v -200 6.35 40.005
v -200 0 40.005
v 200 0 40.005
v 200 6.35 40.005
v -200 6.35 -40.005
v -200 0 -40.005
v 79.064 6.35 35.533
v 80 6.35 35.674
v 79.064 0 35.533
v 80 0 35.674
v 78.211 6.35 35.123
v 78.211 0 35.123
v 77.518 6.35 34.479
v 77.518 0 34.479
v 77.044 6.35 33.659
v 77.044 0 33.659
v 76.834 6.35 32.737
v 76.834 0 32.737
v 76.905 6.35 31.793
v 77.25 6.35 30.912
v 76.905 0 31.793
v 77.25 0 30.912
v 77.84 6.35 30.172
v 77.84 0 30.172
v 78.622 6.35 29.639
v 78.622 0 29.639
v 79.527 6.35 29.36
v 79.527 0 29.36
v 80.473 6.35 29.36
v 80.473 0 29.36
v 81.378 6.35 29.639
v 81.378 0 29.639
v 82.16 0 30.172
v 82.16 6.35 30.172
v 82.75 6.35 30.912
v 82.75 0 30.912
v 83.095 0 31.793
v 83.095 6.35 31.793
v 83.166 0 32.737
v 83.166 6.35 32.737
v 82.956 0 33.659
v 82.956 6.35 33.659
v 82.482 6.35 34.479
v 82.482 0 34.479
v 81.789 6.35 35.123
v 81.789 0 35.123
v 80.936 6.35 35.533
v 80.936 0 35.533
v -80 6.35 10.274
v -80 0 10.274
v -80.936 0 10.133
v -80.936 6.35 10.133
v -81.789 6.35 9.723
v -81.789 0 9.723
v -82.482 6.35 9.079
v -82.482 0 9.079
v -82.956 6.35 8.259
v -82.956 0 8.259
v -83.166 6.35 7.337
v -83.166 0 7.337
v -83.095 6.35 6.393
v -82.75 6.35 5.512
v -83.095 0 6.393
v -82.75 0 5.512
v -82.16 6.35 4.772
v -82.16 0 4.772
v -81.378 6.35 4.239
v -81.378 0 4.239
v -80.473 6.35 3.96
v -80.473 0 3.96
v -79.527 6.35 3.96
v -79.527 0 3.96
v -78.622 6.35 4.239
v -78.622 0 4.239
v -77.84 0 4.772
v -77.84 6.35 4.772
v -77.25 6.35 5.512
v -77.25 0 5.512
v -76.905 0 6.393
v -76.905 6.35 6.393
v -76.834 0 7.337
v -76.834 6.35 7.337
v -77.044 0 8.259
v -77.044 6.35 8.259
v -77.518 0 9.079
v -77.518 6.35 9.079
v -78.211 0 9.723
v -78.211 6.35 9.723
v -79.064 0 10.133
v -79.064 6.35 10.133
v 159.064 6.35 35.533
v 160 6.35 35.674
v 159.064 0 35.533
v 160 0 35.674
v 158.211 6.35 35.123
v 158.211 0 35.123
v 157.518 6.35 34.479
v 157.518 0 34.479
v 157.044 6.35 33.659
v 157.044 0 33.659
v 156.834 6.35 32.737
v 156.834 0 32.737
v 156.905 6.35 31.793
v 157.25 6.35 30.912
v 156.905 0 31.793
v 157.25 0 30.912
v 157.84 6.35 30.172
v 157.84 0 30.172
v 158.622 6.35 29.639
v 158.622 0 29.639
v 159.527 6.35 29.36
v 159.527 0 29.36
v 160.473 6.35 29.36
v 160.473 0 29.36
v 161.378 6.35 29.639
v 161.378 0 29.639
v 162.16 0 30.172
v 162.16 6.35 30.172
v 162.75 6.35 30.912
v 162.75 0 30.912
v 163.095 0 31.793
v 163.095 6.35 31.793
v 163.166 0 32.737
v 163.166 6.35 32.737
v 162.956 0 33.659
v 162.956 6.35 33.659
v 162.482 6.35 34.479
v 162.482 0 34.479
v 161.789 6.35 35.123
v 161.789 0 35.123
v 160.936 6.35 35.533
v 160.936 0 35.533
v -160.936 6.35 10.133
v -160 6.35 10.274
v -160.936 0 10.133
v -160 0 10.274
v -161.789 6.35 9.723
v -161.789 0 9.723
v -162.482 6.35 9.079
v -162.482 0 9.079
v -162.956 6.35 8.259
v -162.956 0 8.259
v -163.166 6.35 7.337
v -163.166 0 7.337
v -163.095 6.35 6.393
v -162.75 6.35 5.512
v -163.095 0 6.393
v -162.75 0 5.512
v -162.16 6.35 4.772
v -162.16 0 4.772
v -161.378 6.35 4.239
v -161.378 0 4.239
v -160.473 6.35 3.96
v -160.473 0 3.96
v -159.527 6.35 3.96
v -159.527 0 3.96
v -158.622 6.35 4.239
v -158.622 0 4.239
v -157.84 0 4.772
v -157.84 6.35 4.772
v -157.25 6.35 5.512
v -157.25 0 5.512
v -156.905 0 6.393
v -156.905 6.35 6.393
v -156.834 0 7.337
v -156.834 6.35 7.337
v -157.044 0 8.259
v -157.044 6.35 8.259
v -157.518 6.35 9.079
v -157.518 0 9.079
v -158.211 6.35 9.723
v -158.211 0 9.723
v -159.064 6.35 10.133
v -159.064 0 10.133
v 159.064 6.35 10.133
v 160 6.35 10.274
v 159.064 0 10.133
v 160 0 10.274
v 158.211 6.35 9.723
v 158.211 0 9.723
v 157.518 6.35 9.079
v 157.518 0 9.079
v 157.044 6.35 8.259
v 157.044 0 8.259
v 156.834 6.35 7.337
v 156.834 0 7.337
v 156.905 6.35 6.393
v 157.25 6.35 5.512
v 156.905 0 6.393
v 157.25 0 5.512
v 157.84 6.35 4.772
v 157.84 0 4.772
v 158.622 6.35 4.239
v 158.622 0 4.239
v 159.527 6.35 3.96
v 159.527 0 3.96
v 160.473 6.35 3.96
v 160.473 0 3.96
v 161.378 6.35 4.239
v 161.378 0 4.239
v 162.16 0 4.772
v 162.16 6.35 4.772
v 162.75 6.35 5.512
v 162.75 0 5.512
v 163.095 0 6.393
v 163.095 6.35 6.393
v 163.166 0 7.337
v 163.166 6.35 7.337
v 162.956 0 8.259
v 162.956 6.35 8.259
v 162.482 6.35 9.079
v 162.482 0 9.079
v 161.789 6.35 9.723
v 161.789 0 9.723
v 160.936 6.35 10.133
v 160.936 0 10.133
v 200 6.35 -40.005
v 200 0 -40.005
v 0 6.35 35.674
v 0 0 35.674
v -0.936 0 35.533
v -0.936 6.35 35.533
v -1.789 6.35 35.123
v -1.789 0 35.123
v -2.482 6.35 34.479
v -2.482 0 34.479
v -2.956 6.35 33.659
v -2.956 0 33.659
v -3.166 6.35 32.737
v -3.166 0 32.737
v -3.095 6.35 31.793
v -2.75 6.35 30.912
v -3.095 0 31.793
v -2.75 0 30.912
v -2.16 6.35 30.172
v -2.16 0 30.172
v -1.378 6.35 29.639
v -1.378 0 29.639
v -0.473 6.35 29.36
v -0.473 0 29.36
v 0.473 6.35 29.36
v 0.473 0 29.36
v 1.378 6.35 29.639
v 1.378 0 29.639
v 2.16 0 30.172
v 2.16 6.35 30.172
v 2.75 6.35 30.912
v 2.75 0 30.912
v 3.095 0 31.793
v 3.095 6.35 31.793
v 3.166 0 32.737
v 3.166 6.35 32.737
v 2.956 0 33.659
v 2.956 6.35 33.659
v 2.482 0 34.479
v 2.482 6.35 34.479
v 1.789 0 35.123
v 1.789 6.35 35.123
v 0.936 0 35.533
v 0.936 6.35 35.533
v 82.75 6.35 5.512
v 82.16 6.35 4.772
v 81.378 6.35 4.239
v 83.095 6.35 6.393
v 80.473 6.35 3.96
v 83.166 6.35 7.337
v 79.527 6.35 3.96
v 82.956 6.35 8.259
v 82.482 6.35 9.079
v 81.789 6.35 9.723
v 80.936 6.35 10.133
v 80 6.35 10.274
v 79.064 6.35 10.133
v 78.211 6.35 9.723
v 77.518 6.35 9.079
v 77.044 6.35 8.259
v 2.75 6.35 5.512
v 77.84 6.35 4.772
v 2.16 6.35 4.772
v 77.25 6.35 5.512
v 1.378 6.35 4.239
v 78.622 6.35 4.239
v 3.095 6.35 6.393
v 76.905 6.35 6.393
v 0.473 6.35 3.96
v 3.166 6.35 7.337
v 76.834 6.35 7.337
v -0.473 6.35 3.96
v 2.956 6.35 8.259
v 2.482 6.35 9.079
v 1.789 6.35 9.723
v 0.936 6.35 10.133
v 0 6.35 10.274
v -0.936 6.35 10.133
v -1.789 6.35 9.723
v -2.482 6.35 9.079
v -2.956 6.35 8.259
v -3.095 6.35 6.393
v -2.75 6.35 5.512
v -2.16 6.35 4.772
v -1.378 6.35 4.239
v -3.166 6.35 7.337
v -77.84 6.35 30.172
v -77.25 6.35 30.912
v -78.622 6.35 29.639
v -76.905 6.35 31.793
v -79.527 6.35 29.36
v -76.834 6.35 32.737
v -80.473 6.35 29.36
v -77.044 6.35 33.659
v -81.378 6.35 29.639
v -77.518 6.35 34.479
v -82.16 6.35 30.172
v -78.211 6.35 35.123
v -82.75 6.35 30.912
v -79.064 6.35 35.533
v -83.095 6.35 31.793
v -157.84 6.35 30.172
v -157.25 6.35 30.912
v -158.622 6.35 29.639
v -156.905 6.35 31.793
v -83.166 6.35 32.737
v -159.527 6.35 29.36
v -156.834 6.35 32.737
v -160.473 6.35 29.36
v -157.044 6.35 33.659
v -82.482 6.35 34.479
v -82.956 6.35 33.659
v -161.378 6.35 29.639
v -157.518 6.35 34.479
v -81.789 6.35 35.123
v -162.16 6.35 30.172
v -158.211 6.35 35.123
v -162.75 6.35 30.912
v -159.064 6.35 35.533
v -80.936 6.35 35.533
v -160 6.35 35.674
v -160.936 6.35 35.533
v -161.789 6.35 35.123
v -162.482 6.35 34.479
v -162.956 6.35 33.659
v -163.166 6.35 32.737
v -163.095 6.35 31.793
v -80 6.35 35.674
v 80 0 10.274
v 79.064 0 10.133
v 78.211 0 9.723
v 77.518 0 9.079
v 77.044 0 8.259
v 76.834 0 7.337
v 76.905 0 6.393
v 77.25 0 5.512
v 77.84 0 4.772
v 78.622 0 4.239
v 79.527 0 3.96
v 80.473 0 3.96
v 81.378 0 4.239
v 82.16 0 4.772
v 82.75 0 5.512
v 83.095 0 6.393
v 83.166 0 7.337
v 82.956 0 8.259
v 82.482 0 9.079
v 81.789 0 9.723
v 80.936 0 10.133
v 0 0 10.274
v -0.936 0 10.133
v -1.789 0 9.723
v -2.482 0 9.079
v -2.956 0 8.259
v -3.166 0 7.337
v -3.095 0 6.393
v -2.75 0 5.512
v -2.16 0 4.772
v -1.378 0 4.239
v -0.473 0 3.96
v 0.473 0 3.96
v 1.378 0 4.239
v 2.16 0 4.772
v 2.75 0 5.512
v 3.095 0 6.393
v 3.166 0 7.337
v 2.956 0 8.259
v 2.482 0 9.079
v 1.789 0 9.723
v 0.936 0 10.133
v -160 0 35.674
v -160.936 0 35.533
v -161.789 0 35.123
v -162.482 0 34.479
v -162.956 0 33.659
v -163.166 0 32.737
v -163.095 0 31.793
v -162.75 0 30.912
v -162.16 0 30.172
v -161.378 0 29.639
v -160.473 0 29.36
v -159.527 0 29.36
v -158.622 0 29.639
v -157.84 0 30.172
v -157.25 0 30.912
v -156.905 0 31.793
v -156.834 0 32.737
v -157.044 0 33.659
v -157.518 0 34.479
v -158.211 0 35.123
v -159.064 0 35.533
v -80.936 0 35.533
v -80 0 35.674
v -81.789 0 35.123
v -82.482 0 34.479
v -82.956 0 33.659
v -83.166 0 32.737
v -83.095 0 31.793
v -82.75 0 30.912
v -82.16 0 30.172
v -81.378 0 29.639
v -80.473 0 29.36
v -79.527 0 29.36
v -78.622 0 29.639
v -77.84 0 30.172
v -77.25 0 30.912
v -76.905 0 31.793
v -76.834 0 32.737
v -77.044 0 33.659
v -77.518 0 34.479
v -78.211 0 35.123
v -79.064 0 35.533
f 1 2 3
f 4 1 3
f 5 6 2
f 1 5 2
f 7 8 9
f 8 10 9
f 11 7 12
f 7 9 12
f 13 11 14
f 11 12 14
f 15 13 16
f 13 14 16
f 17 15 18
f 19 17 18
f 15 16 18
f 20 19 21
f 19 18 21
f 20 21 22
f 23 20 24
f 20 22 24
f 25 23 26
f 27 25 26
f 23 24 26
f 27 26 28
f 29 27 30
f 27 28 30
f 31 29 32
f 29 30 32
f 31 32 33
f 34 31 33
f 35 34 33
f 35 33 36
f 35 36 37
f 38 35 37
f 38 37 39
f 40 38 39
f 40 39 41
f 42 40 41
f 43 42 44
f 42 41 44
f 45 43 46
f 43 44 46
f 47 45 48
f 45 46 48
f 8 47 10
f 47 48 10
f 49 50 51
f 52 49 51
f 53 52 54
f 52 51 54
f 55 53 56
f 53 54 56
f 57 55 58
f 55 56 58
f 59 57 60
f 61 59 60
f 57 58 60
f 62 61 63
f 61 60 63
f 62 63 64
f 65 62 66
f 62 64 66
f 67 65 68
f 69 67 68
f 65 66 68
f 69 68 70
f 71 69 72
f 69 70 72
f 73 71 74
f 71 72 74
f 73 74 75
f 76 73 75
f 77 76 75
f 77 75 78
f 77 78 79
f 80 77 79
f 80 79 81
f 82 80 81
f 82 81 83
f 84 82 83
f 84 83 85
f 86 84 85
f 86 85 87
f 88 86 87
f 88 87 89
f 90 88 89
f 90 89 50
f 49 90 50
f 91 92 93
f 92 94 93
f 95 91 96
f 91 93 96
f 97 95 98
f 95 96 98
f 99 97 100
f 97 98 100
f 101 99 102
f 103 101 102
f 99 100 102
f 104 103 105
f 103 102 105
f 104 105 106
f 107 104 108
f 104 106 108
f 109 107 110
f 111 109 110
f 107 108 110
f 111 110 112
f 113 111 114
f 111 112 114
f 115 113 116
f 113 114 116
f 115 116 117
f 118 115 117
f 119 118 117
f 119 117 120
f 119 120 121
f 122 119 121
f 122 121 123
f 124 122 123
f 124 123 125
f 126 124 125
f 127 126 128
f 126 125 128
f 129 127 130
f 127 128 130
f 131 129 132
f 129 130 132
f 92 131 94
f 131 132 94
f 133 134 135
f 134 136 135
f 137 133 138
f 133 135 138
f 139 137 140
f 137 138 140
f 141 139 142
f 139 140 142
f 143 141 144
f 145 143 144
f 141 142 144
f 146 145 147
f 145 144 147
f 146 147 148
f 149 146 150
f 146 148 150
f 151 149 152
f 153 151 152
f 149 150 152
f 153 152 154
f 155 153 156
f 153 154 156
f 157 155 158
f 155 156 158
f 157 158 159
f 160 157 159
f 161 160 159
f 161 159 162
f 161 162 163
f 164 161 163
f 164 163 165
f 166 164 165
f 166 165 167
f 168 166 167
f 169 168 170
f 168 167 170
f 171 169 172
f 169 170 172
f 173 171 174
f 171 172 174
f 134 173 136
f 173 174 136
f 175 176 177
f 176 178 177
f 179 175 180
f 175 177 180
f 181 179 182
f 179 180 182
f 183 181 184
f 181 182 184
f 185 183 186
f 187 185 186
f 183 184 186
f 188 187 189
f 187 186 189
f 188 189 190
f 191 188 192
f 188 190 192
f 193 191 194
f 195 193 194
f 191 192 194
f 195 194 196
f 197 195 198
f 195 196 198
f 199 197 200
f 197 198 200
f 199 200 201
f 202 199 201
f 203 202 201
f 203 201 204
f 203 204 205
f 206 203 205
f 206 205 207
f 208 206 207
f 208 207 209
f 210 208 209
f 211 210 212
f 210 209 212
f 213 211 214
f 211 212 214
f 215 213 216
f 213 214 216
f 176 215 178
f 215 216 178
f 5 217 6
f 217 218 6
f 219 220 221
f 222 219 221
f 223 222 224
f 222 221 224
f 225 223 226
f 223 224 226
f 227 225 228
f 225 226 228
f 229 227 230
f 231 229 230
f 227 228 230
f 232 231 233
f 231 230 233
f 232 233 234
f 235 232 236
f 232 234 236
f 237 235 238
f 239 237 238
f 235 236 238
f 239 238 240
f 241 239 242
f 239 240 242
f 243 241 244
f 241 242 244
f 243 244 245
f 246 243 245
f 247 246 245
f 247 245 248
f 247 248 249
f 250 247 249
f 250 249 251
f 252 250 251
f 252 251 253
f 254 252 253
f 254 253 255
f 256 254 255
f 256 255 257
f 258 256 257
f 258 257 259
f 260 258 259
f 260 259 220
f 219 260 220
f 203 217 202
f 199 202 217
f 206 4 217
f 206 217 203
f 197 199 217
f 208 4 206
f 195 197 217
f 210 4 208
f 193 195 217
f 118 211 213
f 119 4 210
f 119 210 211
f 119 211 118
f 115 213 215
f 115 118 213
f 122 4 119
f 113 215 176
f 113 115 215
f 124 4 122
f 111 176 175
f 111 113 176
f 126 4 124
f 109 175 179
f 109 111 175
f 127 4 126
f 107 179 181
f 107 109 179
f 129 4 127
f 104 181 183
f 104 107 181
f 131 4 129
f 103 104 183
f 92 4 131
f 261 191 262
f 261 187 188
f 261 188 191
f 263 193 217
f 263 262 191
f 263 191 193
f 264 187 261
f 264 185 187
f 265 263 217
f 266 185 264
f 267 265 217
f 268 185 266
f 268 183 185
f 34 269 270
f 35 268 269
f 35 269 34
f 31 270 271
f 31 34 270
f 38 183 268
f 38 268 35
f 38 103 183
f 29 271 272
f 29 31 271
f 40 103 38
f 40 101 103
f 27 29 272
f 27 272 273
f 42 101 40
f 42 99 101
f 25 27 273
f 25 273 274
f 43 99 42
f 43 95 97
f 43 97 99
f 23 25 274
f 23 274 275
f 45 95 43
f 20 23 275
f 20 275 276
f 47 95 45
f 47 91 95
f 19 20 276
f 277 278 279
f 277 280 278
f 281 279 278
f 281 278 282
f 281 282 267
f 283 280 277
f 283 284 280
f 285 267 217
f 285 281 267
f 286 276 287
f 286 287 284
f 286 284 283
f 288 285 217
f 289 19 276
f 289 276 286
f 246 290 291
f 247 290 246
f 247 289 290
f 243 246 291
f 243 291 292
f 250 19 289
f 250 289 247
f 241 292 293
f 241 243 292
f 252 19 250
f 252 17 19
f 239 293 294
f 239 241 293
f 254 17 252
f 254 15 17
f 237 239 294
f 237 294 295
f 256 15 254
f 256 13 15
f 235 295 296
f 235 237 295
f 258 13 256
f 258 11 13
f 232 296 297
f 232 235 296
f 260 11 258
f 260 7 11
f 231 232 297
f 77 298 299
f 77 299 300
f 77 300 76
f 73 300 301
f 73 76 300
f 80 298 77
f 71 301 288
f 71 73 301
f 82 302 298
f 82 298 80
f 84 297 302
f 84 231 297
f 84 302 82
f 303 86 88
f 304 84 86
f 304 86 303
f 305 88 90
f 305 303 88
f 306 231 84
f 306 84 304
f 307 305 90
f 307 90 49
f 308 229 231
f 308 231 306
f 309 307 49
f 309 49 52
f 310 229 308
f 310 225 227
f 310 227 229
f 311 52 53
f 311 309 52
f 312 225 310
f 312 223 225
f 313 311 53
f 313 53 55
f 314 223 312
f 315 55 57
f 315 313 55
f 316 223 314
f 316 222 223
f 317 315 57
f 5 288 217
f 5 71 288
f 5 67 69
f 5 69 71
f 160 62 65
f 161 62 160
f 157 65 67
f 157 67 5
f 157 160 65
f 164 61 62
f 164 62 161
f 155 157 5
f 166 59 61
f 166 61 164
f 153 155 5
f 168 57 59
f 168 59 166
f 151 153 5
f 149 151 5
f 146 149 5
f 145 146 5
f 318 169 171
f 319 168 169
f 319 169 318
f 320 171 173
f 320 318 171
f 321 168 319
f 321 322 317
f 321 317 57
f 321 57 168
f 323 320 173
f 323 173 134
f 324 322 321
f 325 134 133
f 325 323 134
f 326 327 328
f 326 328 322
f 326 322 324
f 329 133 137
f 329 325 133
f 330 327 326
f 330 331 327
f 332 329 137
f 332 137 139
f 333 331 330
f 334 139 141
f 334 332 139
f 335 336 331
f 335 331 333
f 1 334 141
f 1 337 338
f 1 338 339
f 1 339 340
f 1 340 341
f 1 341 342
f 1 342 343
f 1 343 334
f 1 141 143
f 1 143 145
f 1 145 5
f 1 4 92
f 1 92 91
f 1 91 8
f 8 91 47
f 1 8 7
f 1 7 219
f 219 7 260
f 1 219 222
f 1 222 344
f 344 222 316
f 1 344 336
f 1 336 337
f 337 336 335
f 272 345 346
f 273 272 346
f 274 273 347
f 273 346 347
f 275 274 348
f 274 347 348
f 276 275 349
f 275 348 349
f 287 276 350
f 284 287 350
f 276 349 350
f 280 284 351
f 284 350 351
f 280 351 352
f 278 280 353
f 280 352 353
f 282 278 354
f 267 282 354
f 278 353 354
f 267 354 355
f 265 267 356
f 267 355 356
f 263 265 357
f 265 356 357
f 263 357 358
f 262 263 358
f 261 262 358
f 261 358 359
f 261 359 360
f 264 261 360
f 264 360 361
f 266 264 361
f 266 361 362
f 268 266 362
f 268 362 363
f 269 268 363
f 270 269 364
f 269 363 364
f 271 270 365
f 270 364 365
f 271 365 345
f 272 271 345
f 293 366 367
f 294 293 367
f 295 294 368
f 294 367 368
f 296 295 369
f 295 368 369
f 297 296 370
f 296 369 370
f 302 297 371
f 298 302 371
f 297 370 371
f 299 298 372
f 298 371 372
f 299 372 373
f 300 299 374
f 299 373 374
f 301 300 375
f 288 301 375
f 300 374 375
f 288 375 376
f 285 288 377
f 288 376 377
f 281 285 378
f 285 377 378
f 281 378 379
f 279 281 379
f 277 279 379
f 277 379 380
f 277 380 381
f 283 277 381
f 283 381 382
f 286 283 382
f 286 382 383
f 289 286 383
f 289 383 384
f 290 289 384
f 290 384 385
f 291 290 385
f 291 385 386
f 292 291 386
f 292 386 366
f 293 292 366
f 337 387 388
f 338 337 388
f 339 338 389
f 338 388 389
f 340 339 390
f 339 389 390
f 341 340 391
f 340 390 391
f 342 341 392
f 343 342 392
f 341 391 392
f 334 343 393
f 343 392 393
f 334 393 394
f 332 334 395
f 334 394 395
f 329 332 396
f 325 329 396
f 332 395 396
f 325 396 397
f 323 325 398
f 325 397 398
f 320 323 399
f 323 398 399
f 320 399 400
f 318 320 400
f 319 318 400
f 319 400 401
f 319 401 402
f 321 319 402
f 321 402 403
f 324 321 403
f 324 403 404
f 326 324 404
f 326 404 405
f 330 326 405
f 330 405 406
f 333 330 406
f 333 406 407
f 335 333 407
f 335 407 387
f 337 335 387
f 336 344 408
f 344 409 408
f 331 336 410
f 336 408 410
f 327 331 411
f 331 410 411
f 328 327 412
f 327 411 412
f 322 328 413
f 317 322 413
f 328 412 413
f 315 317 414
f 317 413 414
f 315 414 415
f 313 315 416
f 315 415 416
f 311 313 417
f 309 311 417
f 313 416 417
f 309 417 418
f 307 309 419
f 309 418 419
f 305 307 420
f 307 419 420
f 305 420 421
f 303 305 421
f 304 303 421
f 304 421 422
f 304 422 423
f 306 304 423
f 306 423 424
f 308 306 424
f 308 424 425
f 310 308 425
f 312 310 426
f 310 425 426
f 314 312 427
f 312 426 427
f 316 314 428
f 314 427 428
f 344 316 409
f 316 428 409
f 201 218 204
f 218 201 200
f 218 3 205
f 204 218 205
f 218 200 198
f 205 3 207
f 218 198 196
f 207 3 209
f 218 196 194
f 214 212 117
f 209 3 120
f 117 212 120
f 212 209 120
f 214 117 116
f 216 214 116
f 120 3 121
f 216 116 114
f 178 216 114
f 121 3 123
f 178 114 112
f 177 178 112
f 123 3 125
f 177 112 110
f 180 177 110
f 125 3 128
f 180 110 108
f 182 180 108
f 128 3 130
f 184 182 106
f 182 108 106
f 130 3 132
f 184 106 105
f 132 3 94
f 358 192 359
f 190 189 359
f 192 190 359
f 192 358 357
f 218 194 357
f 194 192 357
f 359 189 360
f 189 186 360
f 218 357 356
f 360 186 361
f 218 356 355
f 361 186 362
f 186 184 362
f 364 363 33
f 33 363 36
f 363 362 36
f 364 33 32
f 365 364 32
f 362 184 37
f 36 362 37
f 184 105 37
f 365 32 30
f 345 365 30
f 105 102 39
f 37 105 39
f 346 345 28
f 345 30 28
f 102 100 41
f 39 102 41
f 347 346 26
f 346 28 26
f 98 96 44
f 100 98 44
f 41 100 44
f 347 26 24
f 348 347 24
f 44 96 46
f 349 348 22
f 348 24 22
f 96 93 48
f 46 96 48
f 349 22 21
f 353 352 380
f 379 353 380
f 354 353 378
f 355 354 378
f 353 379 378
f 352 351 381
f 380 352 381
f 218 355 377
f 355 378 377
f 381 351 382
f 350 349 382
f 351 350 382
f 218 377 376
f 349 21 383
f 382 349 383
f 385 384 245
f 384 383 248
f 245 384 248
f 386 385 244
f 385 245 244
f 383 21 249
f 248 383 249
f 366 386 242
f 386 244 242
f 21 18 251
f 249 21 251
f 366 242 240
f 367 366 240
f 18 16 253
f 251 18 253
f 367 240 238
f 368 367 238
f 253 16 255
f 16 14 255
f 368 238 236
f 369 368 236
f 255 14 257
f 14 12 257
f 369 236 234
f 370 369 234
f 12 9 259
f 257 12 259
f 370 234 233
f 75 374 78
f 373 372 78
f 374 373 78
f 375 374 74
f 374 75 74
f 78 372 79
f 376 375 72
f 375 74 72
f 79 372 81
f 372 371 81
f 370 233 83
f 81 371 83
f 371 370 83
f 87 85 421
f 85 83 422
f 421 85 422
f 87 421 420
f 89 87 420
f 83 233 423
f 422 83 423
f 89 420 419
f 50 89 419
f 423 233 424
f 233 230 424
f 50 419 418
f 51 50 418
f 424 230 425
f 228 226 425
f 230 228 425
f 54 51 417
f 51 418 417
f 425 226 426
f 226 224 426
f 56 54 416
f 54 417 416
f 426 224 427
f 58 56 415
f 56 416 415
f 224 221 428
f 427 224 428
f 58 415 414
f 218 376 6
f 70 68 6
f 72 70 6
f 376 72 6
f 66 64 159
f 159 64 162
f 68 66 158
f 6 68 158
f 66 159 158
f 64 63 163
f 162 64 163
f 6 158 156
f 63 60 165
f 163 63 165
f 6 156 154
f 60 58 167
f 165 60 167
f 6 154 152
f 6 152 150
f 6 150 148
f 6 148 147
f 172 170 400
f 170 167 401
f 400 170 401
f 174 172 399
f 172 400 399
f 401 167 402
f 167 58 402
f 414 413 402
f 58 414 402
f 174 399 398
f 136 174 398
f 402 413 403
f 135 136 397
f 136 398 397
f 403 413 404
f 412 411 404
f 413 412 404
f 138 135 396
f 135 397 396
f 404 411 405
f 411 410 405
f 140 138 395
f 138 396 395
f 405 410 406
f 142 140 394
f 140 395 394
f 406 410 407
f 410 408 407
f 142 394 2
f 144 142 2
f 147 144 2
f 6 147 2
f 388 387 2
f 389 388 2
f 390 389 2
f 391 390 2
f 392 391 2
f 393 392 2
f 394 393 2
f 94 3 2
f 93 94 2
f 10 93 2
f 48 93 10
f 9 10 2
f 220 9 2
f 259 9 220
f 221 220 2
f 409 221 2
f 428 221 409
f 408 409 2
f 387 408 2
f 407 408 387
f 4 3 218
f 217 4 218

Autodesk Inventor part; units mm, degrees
ref_plane "YZ Plane" through (0, 0, 0) normal (1, 0, 0) x (0, 1, 0)
ref_plane "XZ Plane" through (0, 0, 0) normal (0, 1, 0) x (-1, 0, 0)
ref_plane "XY Plane" through (0, 0, 0) normal (0, 0, 1) x (1, 0, 0)
sketch "Sketch1" plane through (0, 0, 0) normal (0, 1, 0) x (-1, 0, 0)
  line L0 (200, 40.005) -> (-200, 40.005)
  line L1 (-200, 40.005) -> (-200, -40.005)
  line L2 (-200, -40.005) -> (200, -40.005)
  line L3 (200, -40.005) -> (200, 40.005)
  line L4 (200, 40.005) -> (-200, -40.005) construction
  line L5 (-200, 40.005) -> (200, -40.005) construction
  point P0 (0, 0)
  dimension "d0" = 400
  dimension "d1" = 80.01
extrude "Extrusion1" add sketch "Sketch1" along normal blind 6.35
sketch "Sketch2" plane through (0, 6.35, 0) normal (0, 1, 0) x (1, 0, 0)
  line L0 (-200, -40.005) -> (200, -40.005) projected
  line L1 (200, -40.005) -> (200, 40.005) projected
  line L2 (200, 40.005) -> (-200, 40.005) projected
  line L3 (-200, 40.005) -> (-200, -40.005) projected
  line L4 (-200, 18.3007) -> (200, 18.3007) construction
  point P0 (-200, 0.005)
  point P1 (-200, -7.0993)
  point P2 (-160, -7.0993)
  point P3 (-80, -7.0993)
  point P4 (0, -7.0993)
  point P5 (80, -7.0993)
  point P6 (160, -7.0993)
  point P7 (-160, -32.4993)
  point P8 (-80, -7.0993)
  point P9 (-80, -32.4993)
  point P10 (0, -7.0993)
  point P11 (0, -32.4993)
  point P12 (80, -7.0993)
  point P13 (80, -32.4993)
  point P14 (160, -7.0993)
  point P15 (160, -32.4993)
  dimension "d4" = 21.7043
  dimension "d5" = 40
  dimension "d6" = 25.4
  dimension "d7" = 40
  dimension "d24" = 25.4
  dimension "d27" = 80
hole "Hole2" at (-160, 6.35, 7.0993) at (-80, 6.35, 7.0993) at (0, 6.35, 7.0993) at (80, 6.35, 7.0993) at (160, 6.35, 7.0993) at (-160, 6.35, 32.4993) at (-80, 6.35, 32.4993) at (0, 6.35, 32.4993) at (80, 6.35, 32.4993) at (160, 6.35, 32.4993) direction (0, -1, 0) diameter 6.35 depth 25.4 tip angle 118
properties part number "y_axis_mounting_plate"
